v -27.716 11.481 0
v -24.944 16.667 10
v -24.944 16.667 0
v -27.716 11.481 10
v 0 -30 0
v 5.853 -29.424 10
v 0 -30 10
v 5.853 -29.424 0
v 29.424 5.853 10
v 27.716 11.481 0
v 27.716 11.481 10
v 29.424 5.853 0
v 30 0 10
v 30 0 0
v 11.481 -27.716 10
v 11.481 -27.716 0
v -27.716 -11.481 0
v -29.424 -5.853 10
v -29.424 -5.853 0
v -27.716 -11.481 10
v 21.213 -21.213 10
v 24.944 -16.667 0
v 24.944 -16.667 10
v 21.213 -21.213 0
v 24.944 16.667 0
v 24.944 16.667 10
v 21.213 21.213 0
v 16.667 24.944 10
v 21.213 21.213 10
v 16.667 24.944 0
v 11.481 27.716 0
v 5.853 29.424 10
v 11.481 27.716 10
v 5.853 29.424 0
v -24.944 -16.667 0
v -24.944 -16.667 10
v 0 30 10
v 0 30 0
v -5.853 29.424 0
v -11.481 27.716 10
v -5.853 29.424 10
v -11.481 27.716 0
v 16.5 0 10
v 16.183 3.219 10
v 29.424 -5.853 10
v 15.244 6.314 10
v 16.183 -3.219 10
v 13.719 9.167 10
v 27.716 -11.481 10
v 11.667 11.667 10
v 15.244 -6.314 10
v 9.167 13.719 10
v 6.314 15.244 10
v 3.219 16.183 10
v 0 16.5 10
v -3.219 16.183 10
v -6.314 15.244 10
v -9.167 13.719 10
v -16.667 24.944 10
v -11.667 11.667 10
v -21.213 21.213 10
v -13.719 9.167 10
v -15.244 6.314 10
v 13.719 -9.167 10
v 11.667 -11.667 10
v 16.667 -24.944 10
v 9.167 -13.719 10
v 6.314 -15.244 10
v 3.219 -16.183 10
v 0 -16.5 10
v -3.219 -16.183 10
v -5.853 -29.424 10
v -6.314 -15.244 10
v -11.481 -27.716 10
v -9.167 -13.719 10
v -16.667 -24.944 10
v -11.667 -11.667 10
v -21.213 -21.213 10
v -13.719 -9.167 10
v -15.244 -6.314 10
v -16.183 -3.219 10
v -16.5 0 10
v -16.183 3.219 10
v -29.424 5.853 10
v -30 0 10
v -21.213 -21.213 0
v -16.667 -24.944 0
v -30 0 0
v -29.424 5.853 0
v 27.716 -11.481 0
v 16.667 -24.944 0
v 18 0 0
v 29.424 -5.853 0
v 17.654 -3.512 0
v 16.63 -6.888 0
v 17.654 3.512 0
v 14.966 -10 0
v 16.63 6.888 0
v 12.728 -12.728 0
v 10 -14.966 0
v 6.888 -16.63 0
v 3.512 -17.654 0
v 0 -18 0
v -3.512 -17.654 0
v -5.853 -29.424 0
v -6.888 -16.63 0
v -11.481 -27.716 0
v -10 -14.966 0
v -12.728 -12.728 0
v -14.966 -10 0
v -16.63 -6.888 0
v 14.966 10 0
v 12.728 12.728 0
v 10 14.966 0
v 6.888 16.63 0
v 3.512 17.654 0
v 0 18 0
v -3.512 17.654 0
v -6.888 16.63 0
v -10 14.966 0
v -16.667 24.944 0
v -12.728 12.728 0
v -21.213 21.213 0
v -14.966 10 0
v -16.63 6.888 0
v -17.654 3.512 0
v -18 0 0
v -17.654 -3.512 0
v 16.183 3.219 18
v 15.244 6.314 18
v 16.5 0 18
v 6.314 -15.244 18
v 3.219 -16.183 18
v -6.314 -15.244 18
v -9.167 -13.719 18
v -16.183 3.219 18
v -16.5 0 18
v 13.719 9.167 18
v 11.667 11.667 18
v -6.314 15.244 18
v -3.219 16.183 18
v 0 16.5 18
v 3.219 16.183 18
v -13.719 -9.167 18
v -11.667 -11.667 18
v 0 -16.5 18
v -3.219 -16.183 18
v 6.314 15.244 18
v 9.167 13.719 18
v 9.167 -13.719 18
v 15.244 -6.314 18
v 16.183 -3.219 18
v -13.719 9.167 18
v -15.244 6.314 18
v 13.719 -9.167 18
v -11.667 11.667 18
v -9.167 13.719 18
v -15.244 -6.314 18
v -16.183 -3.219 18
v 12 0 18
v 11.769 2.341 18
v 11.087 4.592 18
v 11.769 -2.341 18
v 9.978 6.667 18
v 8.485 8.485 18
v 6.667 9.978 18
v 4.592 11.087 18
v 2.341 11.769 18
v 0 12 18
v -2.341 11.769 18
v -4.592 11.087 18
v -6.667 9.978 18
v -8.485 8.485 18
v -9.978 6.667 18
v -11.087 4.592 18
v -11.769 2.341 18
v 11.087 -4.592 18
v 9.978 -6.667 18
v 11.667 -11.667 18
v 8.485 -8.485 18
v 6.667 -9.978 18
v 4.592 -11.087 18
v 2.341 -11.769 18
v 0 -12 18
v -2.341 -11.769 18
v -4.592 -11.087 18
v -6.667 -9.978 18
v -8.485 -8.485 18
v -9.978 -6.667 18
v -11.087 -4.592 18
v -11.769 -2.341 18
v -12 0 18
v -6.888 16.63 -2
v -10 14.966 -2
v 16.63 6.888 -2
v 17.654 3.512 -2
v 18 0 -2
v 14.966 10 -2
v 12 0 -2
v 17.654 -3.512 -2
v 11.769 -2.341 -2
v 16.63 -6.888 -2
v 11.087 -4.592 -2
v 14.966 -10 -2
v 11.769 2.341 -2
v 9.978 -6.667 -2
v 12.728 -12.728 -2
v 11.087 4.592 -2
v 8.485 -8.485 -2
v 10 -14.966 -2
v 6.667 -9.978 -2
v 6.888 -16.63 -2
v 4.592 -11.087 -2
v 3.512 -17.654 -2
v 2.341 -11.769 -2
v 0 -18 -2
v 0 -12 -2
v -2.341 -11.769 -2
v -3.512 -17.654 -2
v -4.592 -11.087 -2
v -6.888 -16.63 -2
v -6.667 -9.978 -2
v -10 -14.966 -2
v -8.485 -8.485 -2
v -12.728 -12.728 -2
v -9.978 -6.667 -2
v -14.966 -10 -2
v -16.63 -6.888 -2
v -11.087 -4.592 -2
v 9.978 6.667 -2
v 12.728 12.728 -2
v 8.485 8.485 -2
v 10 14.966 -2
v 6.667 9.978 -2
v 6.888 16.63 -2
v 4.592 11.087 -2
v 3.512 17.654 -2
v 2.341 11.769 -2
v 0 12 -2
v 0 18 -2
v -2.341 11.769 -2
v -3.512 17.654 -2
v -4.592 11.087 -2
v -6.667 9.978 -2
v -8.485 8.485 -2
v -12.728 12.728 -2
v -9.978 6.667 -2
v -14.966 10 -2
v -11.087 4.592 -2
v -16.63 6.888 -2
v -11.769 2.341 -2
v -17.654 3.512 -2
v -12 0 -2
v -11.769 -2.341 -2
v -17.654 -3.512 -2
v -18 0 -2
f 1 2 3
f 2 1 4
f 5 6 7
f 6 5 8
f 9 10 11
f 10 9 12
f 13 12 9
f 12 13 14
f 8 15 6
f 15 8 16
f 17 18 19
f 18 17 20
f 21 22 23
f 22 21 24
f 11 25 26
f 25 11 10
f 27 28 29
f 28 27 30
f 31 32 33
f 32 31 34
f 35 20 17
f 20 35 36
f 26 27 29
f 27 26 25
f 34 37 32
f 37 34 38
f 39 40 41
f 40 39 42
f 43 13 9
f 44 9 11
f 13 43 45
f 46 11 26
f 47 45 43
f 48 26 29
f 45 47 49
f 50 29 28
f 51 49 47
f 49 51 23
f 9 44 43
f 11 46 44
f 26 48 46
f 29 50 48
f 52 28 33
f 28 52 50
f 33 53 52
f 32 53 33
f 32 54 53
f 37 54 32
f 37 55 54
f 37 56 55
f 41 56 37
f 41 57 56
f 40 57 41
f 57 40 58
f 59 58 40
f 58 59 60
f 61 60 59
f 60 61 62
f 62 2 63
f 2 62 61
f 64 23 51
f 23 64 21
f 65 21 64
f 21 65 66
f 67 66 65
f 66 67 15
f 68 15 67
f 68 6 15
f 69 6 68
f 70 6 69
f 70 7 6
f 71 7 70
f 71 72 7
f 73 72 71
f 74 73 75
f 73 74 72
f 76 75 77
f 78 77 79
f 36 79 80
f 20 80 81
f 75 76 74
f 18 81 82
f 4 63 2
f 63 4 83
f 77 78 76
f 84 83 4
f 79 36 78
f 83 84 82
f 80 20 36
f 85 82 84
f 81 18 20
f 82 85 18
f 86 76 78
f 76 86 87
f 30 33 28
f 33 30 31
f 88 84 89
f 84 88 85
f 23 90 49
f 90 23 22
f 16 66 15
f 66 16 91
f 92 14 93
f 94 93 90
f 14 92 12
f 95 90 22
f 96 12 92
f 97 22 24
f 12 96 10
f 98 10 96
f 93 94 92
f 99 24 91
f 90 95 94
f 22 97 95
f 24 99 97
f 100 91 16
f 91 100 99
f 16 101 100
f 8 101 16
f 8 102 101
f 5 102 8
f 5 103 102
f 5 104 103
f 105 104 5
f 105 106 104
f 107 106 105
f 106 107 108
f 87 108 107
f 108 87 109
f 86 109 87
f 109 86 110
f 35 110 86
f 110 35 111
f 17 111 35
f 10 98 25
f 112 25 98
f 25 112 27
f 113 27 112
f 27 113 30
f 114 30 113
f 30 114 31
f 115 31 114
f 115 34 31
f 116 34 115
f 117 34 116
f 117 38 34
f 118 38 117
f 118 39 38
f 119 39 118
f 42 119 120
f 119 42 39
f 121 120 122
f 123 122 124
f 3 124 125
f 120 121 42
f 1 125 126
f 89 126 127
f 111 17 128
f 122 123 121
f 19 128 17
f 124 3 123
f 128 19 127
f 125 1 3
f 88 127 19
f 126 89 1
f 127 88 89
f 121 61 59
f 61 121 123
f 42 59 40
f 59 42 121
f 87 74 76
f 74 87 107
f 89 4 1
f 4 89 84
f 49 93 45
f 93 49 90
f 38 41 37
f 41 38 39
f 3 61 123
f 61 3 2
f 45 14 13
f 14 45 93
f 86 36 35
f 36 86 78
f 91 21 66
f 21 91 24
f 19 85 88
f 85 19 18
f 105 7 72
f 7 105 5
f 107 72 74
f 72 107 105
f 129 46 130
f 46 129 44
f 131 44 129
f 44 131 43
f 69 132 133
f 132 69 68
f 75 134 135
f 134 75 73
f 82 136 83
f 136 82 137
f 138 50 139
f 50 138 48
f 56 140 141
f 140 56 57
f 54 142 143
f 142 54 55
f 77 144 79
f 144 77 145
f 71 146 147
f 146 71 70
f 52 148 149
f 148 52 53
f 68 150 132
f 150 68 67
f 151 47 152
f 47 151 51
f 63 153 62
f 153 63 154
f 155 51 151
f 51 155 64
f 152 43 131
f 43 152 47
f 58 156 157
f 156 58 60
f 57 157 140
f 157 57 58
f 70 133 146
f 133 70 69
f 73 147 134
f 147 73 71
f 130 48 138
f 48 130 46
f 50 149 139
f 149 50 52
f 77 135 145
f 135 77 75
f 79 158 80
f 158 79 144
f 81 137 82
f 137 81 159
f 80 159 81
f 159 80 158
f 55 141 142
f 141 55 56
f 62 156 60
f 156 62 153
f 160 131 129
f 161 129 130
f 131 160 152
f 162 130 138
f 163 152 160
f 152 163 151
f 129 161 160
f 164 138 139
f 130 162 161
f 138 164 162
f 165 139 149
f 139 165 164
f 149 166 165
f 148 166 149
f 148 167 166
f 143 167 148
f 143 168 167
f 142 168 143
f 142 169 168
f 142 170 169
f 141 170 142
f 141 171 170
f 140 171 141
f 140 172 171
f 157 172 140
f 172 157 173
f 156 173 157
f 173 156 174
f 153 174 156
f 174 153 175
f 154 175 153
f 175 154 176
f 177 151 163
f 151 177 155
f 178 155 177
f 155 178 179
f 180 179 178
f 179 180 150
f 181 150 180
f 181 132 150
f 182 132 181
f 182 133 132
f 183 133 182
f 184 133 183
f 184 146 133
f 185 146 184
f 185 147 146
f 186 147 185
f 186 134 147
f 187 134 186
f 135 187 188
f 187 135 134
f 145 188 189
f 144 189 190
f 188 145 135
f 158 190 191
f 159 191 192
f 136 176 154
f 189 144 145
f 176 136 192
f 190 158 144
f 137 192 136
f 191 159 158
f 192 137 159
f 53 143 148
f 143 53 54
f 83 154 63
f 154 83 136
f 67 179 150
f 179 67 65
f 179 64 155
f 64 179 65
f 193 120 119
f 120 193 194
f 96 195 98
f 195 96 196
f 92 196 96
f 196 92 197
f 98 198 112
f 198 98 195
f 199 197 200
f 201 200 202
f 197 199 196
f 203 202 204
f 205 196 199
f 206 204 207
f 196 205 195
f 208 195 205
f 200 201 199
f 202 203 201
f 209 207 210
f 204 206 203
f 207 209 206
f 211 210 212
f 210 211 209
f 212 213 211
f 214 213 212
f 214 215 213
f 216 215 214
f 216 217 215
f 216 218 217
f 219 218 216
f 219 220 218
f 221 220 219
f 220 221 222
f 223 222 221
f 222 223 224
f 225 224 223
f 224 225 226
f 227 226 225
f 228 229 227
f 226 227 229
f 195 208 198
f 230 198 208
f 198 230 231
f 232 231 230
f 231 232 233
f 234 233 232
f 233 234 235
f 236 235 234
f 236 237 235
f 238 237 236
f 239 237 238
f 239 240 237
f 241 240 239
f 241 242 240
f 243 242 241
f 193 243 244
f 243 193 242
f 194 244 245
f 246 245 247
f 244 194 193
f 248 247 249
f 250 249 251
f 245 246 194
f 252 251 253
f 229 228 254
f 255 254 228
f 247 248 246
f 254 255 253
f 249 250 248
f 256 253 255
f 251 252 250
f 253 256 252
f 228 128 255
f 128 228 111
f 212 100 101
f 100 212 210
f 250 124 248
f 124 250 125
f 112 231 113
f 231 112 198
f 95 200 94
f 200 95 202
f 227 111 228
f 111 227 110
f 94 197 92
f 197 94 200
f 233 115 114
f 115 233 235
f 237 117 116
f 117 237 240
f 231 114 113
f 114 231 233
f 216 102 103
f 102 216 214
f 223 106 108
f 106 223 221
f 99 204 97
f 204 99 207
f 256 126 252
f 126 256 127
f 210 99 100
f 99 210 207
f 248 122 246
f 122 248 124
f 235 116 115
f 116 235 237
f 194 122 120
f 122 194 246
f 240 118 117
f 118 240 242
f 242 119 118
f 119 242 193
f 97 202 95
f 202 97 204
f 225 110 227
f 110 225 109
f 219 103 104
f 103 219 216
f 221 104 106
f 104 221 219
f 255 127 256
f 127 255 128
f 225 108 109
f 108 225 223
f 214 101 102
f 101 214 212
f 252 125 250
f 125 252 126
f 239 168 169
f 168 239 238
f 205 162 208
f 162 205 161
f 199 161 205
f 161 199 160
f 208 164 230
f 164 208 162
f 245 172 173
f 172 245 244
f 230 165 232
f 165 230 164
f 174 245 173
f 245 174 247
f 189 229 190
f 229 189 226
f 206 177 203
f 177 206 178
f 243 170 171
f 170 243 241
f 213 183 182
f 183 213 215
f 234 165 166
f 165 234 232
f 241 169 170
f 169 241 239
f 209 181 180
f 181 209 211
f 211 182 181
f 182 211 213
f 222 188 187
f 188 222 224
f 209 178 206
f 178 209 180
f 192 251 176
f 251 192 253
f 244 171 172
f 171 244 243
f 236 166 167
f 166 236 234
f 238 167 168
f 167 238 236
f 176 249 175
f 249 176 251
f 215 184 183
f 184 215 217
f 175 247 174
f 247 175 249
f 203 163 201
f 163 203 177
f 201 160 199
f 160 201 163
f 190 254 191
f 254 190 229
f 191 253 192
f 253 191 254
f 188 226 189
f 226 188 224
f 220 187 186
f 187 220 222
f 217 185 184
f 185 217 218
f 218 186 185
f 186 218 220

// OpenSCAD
$fn = 32;

// ----------------------------------------------------------------------
// Bolt-circle flange: 60 mm outside, 4 bolt holes, bore 24 mm
// ----------------------------------------------------------------------

// --- parameters (mm) ---
flange_d = 60;            // flange outside diameter
flange_t = 10;            // flange thickness
bolts = 4;                // number of bolt holes
bolt_d = 13;              // bolt clearance
bolt_r = 4;               // bolt circle radius
bore_d = 24;              // centre bore
hub_d = 33;               // raised hub diameter
hub_h = 8;                // raised hub height
spigot_d = 36;            // spigot diameter
spigot_h = 3;             // spigot height below the flange
sink = 1;                 // overlap into the flange

module body() {
  cylinder(h = flange_t, d = flange_d);
  /* raised hub, sunk 1 mm into the flange */
  translate([0, 0, flange_t - 1]) cylinder(h = hub_h + 1, d = hub_d);
  /* spigot on the back face, sunk into the flange */
  translate([0, 0, -spigot_h + sink]) cylinder(h = spigot_h, d = spigot_d);
}

difference() {
  body();
  /* bolt circle */
  for (i = [0 : bolts - 1]) rotate([0, 0, i * 360 / bolts]) translate([bolt_r, 0, -spigot_h - 1]) cylinder(h = flange_t + hub_h + spigot_h + 3, d = bolt_d);
  translate([0, 0, -spigot_h - 1]) cylinder(h = flange_t + hub_h + spigot_h + 3, d = bore_d);
}
